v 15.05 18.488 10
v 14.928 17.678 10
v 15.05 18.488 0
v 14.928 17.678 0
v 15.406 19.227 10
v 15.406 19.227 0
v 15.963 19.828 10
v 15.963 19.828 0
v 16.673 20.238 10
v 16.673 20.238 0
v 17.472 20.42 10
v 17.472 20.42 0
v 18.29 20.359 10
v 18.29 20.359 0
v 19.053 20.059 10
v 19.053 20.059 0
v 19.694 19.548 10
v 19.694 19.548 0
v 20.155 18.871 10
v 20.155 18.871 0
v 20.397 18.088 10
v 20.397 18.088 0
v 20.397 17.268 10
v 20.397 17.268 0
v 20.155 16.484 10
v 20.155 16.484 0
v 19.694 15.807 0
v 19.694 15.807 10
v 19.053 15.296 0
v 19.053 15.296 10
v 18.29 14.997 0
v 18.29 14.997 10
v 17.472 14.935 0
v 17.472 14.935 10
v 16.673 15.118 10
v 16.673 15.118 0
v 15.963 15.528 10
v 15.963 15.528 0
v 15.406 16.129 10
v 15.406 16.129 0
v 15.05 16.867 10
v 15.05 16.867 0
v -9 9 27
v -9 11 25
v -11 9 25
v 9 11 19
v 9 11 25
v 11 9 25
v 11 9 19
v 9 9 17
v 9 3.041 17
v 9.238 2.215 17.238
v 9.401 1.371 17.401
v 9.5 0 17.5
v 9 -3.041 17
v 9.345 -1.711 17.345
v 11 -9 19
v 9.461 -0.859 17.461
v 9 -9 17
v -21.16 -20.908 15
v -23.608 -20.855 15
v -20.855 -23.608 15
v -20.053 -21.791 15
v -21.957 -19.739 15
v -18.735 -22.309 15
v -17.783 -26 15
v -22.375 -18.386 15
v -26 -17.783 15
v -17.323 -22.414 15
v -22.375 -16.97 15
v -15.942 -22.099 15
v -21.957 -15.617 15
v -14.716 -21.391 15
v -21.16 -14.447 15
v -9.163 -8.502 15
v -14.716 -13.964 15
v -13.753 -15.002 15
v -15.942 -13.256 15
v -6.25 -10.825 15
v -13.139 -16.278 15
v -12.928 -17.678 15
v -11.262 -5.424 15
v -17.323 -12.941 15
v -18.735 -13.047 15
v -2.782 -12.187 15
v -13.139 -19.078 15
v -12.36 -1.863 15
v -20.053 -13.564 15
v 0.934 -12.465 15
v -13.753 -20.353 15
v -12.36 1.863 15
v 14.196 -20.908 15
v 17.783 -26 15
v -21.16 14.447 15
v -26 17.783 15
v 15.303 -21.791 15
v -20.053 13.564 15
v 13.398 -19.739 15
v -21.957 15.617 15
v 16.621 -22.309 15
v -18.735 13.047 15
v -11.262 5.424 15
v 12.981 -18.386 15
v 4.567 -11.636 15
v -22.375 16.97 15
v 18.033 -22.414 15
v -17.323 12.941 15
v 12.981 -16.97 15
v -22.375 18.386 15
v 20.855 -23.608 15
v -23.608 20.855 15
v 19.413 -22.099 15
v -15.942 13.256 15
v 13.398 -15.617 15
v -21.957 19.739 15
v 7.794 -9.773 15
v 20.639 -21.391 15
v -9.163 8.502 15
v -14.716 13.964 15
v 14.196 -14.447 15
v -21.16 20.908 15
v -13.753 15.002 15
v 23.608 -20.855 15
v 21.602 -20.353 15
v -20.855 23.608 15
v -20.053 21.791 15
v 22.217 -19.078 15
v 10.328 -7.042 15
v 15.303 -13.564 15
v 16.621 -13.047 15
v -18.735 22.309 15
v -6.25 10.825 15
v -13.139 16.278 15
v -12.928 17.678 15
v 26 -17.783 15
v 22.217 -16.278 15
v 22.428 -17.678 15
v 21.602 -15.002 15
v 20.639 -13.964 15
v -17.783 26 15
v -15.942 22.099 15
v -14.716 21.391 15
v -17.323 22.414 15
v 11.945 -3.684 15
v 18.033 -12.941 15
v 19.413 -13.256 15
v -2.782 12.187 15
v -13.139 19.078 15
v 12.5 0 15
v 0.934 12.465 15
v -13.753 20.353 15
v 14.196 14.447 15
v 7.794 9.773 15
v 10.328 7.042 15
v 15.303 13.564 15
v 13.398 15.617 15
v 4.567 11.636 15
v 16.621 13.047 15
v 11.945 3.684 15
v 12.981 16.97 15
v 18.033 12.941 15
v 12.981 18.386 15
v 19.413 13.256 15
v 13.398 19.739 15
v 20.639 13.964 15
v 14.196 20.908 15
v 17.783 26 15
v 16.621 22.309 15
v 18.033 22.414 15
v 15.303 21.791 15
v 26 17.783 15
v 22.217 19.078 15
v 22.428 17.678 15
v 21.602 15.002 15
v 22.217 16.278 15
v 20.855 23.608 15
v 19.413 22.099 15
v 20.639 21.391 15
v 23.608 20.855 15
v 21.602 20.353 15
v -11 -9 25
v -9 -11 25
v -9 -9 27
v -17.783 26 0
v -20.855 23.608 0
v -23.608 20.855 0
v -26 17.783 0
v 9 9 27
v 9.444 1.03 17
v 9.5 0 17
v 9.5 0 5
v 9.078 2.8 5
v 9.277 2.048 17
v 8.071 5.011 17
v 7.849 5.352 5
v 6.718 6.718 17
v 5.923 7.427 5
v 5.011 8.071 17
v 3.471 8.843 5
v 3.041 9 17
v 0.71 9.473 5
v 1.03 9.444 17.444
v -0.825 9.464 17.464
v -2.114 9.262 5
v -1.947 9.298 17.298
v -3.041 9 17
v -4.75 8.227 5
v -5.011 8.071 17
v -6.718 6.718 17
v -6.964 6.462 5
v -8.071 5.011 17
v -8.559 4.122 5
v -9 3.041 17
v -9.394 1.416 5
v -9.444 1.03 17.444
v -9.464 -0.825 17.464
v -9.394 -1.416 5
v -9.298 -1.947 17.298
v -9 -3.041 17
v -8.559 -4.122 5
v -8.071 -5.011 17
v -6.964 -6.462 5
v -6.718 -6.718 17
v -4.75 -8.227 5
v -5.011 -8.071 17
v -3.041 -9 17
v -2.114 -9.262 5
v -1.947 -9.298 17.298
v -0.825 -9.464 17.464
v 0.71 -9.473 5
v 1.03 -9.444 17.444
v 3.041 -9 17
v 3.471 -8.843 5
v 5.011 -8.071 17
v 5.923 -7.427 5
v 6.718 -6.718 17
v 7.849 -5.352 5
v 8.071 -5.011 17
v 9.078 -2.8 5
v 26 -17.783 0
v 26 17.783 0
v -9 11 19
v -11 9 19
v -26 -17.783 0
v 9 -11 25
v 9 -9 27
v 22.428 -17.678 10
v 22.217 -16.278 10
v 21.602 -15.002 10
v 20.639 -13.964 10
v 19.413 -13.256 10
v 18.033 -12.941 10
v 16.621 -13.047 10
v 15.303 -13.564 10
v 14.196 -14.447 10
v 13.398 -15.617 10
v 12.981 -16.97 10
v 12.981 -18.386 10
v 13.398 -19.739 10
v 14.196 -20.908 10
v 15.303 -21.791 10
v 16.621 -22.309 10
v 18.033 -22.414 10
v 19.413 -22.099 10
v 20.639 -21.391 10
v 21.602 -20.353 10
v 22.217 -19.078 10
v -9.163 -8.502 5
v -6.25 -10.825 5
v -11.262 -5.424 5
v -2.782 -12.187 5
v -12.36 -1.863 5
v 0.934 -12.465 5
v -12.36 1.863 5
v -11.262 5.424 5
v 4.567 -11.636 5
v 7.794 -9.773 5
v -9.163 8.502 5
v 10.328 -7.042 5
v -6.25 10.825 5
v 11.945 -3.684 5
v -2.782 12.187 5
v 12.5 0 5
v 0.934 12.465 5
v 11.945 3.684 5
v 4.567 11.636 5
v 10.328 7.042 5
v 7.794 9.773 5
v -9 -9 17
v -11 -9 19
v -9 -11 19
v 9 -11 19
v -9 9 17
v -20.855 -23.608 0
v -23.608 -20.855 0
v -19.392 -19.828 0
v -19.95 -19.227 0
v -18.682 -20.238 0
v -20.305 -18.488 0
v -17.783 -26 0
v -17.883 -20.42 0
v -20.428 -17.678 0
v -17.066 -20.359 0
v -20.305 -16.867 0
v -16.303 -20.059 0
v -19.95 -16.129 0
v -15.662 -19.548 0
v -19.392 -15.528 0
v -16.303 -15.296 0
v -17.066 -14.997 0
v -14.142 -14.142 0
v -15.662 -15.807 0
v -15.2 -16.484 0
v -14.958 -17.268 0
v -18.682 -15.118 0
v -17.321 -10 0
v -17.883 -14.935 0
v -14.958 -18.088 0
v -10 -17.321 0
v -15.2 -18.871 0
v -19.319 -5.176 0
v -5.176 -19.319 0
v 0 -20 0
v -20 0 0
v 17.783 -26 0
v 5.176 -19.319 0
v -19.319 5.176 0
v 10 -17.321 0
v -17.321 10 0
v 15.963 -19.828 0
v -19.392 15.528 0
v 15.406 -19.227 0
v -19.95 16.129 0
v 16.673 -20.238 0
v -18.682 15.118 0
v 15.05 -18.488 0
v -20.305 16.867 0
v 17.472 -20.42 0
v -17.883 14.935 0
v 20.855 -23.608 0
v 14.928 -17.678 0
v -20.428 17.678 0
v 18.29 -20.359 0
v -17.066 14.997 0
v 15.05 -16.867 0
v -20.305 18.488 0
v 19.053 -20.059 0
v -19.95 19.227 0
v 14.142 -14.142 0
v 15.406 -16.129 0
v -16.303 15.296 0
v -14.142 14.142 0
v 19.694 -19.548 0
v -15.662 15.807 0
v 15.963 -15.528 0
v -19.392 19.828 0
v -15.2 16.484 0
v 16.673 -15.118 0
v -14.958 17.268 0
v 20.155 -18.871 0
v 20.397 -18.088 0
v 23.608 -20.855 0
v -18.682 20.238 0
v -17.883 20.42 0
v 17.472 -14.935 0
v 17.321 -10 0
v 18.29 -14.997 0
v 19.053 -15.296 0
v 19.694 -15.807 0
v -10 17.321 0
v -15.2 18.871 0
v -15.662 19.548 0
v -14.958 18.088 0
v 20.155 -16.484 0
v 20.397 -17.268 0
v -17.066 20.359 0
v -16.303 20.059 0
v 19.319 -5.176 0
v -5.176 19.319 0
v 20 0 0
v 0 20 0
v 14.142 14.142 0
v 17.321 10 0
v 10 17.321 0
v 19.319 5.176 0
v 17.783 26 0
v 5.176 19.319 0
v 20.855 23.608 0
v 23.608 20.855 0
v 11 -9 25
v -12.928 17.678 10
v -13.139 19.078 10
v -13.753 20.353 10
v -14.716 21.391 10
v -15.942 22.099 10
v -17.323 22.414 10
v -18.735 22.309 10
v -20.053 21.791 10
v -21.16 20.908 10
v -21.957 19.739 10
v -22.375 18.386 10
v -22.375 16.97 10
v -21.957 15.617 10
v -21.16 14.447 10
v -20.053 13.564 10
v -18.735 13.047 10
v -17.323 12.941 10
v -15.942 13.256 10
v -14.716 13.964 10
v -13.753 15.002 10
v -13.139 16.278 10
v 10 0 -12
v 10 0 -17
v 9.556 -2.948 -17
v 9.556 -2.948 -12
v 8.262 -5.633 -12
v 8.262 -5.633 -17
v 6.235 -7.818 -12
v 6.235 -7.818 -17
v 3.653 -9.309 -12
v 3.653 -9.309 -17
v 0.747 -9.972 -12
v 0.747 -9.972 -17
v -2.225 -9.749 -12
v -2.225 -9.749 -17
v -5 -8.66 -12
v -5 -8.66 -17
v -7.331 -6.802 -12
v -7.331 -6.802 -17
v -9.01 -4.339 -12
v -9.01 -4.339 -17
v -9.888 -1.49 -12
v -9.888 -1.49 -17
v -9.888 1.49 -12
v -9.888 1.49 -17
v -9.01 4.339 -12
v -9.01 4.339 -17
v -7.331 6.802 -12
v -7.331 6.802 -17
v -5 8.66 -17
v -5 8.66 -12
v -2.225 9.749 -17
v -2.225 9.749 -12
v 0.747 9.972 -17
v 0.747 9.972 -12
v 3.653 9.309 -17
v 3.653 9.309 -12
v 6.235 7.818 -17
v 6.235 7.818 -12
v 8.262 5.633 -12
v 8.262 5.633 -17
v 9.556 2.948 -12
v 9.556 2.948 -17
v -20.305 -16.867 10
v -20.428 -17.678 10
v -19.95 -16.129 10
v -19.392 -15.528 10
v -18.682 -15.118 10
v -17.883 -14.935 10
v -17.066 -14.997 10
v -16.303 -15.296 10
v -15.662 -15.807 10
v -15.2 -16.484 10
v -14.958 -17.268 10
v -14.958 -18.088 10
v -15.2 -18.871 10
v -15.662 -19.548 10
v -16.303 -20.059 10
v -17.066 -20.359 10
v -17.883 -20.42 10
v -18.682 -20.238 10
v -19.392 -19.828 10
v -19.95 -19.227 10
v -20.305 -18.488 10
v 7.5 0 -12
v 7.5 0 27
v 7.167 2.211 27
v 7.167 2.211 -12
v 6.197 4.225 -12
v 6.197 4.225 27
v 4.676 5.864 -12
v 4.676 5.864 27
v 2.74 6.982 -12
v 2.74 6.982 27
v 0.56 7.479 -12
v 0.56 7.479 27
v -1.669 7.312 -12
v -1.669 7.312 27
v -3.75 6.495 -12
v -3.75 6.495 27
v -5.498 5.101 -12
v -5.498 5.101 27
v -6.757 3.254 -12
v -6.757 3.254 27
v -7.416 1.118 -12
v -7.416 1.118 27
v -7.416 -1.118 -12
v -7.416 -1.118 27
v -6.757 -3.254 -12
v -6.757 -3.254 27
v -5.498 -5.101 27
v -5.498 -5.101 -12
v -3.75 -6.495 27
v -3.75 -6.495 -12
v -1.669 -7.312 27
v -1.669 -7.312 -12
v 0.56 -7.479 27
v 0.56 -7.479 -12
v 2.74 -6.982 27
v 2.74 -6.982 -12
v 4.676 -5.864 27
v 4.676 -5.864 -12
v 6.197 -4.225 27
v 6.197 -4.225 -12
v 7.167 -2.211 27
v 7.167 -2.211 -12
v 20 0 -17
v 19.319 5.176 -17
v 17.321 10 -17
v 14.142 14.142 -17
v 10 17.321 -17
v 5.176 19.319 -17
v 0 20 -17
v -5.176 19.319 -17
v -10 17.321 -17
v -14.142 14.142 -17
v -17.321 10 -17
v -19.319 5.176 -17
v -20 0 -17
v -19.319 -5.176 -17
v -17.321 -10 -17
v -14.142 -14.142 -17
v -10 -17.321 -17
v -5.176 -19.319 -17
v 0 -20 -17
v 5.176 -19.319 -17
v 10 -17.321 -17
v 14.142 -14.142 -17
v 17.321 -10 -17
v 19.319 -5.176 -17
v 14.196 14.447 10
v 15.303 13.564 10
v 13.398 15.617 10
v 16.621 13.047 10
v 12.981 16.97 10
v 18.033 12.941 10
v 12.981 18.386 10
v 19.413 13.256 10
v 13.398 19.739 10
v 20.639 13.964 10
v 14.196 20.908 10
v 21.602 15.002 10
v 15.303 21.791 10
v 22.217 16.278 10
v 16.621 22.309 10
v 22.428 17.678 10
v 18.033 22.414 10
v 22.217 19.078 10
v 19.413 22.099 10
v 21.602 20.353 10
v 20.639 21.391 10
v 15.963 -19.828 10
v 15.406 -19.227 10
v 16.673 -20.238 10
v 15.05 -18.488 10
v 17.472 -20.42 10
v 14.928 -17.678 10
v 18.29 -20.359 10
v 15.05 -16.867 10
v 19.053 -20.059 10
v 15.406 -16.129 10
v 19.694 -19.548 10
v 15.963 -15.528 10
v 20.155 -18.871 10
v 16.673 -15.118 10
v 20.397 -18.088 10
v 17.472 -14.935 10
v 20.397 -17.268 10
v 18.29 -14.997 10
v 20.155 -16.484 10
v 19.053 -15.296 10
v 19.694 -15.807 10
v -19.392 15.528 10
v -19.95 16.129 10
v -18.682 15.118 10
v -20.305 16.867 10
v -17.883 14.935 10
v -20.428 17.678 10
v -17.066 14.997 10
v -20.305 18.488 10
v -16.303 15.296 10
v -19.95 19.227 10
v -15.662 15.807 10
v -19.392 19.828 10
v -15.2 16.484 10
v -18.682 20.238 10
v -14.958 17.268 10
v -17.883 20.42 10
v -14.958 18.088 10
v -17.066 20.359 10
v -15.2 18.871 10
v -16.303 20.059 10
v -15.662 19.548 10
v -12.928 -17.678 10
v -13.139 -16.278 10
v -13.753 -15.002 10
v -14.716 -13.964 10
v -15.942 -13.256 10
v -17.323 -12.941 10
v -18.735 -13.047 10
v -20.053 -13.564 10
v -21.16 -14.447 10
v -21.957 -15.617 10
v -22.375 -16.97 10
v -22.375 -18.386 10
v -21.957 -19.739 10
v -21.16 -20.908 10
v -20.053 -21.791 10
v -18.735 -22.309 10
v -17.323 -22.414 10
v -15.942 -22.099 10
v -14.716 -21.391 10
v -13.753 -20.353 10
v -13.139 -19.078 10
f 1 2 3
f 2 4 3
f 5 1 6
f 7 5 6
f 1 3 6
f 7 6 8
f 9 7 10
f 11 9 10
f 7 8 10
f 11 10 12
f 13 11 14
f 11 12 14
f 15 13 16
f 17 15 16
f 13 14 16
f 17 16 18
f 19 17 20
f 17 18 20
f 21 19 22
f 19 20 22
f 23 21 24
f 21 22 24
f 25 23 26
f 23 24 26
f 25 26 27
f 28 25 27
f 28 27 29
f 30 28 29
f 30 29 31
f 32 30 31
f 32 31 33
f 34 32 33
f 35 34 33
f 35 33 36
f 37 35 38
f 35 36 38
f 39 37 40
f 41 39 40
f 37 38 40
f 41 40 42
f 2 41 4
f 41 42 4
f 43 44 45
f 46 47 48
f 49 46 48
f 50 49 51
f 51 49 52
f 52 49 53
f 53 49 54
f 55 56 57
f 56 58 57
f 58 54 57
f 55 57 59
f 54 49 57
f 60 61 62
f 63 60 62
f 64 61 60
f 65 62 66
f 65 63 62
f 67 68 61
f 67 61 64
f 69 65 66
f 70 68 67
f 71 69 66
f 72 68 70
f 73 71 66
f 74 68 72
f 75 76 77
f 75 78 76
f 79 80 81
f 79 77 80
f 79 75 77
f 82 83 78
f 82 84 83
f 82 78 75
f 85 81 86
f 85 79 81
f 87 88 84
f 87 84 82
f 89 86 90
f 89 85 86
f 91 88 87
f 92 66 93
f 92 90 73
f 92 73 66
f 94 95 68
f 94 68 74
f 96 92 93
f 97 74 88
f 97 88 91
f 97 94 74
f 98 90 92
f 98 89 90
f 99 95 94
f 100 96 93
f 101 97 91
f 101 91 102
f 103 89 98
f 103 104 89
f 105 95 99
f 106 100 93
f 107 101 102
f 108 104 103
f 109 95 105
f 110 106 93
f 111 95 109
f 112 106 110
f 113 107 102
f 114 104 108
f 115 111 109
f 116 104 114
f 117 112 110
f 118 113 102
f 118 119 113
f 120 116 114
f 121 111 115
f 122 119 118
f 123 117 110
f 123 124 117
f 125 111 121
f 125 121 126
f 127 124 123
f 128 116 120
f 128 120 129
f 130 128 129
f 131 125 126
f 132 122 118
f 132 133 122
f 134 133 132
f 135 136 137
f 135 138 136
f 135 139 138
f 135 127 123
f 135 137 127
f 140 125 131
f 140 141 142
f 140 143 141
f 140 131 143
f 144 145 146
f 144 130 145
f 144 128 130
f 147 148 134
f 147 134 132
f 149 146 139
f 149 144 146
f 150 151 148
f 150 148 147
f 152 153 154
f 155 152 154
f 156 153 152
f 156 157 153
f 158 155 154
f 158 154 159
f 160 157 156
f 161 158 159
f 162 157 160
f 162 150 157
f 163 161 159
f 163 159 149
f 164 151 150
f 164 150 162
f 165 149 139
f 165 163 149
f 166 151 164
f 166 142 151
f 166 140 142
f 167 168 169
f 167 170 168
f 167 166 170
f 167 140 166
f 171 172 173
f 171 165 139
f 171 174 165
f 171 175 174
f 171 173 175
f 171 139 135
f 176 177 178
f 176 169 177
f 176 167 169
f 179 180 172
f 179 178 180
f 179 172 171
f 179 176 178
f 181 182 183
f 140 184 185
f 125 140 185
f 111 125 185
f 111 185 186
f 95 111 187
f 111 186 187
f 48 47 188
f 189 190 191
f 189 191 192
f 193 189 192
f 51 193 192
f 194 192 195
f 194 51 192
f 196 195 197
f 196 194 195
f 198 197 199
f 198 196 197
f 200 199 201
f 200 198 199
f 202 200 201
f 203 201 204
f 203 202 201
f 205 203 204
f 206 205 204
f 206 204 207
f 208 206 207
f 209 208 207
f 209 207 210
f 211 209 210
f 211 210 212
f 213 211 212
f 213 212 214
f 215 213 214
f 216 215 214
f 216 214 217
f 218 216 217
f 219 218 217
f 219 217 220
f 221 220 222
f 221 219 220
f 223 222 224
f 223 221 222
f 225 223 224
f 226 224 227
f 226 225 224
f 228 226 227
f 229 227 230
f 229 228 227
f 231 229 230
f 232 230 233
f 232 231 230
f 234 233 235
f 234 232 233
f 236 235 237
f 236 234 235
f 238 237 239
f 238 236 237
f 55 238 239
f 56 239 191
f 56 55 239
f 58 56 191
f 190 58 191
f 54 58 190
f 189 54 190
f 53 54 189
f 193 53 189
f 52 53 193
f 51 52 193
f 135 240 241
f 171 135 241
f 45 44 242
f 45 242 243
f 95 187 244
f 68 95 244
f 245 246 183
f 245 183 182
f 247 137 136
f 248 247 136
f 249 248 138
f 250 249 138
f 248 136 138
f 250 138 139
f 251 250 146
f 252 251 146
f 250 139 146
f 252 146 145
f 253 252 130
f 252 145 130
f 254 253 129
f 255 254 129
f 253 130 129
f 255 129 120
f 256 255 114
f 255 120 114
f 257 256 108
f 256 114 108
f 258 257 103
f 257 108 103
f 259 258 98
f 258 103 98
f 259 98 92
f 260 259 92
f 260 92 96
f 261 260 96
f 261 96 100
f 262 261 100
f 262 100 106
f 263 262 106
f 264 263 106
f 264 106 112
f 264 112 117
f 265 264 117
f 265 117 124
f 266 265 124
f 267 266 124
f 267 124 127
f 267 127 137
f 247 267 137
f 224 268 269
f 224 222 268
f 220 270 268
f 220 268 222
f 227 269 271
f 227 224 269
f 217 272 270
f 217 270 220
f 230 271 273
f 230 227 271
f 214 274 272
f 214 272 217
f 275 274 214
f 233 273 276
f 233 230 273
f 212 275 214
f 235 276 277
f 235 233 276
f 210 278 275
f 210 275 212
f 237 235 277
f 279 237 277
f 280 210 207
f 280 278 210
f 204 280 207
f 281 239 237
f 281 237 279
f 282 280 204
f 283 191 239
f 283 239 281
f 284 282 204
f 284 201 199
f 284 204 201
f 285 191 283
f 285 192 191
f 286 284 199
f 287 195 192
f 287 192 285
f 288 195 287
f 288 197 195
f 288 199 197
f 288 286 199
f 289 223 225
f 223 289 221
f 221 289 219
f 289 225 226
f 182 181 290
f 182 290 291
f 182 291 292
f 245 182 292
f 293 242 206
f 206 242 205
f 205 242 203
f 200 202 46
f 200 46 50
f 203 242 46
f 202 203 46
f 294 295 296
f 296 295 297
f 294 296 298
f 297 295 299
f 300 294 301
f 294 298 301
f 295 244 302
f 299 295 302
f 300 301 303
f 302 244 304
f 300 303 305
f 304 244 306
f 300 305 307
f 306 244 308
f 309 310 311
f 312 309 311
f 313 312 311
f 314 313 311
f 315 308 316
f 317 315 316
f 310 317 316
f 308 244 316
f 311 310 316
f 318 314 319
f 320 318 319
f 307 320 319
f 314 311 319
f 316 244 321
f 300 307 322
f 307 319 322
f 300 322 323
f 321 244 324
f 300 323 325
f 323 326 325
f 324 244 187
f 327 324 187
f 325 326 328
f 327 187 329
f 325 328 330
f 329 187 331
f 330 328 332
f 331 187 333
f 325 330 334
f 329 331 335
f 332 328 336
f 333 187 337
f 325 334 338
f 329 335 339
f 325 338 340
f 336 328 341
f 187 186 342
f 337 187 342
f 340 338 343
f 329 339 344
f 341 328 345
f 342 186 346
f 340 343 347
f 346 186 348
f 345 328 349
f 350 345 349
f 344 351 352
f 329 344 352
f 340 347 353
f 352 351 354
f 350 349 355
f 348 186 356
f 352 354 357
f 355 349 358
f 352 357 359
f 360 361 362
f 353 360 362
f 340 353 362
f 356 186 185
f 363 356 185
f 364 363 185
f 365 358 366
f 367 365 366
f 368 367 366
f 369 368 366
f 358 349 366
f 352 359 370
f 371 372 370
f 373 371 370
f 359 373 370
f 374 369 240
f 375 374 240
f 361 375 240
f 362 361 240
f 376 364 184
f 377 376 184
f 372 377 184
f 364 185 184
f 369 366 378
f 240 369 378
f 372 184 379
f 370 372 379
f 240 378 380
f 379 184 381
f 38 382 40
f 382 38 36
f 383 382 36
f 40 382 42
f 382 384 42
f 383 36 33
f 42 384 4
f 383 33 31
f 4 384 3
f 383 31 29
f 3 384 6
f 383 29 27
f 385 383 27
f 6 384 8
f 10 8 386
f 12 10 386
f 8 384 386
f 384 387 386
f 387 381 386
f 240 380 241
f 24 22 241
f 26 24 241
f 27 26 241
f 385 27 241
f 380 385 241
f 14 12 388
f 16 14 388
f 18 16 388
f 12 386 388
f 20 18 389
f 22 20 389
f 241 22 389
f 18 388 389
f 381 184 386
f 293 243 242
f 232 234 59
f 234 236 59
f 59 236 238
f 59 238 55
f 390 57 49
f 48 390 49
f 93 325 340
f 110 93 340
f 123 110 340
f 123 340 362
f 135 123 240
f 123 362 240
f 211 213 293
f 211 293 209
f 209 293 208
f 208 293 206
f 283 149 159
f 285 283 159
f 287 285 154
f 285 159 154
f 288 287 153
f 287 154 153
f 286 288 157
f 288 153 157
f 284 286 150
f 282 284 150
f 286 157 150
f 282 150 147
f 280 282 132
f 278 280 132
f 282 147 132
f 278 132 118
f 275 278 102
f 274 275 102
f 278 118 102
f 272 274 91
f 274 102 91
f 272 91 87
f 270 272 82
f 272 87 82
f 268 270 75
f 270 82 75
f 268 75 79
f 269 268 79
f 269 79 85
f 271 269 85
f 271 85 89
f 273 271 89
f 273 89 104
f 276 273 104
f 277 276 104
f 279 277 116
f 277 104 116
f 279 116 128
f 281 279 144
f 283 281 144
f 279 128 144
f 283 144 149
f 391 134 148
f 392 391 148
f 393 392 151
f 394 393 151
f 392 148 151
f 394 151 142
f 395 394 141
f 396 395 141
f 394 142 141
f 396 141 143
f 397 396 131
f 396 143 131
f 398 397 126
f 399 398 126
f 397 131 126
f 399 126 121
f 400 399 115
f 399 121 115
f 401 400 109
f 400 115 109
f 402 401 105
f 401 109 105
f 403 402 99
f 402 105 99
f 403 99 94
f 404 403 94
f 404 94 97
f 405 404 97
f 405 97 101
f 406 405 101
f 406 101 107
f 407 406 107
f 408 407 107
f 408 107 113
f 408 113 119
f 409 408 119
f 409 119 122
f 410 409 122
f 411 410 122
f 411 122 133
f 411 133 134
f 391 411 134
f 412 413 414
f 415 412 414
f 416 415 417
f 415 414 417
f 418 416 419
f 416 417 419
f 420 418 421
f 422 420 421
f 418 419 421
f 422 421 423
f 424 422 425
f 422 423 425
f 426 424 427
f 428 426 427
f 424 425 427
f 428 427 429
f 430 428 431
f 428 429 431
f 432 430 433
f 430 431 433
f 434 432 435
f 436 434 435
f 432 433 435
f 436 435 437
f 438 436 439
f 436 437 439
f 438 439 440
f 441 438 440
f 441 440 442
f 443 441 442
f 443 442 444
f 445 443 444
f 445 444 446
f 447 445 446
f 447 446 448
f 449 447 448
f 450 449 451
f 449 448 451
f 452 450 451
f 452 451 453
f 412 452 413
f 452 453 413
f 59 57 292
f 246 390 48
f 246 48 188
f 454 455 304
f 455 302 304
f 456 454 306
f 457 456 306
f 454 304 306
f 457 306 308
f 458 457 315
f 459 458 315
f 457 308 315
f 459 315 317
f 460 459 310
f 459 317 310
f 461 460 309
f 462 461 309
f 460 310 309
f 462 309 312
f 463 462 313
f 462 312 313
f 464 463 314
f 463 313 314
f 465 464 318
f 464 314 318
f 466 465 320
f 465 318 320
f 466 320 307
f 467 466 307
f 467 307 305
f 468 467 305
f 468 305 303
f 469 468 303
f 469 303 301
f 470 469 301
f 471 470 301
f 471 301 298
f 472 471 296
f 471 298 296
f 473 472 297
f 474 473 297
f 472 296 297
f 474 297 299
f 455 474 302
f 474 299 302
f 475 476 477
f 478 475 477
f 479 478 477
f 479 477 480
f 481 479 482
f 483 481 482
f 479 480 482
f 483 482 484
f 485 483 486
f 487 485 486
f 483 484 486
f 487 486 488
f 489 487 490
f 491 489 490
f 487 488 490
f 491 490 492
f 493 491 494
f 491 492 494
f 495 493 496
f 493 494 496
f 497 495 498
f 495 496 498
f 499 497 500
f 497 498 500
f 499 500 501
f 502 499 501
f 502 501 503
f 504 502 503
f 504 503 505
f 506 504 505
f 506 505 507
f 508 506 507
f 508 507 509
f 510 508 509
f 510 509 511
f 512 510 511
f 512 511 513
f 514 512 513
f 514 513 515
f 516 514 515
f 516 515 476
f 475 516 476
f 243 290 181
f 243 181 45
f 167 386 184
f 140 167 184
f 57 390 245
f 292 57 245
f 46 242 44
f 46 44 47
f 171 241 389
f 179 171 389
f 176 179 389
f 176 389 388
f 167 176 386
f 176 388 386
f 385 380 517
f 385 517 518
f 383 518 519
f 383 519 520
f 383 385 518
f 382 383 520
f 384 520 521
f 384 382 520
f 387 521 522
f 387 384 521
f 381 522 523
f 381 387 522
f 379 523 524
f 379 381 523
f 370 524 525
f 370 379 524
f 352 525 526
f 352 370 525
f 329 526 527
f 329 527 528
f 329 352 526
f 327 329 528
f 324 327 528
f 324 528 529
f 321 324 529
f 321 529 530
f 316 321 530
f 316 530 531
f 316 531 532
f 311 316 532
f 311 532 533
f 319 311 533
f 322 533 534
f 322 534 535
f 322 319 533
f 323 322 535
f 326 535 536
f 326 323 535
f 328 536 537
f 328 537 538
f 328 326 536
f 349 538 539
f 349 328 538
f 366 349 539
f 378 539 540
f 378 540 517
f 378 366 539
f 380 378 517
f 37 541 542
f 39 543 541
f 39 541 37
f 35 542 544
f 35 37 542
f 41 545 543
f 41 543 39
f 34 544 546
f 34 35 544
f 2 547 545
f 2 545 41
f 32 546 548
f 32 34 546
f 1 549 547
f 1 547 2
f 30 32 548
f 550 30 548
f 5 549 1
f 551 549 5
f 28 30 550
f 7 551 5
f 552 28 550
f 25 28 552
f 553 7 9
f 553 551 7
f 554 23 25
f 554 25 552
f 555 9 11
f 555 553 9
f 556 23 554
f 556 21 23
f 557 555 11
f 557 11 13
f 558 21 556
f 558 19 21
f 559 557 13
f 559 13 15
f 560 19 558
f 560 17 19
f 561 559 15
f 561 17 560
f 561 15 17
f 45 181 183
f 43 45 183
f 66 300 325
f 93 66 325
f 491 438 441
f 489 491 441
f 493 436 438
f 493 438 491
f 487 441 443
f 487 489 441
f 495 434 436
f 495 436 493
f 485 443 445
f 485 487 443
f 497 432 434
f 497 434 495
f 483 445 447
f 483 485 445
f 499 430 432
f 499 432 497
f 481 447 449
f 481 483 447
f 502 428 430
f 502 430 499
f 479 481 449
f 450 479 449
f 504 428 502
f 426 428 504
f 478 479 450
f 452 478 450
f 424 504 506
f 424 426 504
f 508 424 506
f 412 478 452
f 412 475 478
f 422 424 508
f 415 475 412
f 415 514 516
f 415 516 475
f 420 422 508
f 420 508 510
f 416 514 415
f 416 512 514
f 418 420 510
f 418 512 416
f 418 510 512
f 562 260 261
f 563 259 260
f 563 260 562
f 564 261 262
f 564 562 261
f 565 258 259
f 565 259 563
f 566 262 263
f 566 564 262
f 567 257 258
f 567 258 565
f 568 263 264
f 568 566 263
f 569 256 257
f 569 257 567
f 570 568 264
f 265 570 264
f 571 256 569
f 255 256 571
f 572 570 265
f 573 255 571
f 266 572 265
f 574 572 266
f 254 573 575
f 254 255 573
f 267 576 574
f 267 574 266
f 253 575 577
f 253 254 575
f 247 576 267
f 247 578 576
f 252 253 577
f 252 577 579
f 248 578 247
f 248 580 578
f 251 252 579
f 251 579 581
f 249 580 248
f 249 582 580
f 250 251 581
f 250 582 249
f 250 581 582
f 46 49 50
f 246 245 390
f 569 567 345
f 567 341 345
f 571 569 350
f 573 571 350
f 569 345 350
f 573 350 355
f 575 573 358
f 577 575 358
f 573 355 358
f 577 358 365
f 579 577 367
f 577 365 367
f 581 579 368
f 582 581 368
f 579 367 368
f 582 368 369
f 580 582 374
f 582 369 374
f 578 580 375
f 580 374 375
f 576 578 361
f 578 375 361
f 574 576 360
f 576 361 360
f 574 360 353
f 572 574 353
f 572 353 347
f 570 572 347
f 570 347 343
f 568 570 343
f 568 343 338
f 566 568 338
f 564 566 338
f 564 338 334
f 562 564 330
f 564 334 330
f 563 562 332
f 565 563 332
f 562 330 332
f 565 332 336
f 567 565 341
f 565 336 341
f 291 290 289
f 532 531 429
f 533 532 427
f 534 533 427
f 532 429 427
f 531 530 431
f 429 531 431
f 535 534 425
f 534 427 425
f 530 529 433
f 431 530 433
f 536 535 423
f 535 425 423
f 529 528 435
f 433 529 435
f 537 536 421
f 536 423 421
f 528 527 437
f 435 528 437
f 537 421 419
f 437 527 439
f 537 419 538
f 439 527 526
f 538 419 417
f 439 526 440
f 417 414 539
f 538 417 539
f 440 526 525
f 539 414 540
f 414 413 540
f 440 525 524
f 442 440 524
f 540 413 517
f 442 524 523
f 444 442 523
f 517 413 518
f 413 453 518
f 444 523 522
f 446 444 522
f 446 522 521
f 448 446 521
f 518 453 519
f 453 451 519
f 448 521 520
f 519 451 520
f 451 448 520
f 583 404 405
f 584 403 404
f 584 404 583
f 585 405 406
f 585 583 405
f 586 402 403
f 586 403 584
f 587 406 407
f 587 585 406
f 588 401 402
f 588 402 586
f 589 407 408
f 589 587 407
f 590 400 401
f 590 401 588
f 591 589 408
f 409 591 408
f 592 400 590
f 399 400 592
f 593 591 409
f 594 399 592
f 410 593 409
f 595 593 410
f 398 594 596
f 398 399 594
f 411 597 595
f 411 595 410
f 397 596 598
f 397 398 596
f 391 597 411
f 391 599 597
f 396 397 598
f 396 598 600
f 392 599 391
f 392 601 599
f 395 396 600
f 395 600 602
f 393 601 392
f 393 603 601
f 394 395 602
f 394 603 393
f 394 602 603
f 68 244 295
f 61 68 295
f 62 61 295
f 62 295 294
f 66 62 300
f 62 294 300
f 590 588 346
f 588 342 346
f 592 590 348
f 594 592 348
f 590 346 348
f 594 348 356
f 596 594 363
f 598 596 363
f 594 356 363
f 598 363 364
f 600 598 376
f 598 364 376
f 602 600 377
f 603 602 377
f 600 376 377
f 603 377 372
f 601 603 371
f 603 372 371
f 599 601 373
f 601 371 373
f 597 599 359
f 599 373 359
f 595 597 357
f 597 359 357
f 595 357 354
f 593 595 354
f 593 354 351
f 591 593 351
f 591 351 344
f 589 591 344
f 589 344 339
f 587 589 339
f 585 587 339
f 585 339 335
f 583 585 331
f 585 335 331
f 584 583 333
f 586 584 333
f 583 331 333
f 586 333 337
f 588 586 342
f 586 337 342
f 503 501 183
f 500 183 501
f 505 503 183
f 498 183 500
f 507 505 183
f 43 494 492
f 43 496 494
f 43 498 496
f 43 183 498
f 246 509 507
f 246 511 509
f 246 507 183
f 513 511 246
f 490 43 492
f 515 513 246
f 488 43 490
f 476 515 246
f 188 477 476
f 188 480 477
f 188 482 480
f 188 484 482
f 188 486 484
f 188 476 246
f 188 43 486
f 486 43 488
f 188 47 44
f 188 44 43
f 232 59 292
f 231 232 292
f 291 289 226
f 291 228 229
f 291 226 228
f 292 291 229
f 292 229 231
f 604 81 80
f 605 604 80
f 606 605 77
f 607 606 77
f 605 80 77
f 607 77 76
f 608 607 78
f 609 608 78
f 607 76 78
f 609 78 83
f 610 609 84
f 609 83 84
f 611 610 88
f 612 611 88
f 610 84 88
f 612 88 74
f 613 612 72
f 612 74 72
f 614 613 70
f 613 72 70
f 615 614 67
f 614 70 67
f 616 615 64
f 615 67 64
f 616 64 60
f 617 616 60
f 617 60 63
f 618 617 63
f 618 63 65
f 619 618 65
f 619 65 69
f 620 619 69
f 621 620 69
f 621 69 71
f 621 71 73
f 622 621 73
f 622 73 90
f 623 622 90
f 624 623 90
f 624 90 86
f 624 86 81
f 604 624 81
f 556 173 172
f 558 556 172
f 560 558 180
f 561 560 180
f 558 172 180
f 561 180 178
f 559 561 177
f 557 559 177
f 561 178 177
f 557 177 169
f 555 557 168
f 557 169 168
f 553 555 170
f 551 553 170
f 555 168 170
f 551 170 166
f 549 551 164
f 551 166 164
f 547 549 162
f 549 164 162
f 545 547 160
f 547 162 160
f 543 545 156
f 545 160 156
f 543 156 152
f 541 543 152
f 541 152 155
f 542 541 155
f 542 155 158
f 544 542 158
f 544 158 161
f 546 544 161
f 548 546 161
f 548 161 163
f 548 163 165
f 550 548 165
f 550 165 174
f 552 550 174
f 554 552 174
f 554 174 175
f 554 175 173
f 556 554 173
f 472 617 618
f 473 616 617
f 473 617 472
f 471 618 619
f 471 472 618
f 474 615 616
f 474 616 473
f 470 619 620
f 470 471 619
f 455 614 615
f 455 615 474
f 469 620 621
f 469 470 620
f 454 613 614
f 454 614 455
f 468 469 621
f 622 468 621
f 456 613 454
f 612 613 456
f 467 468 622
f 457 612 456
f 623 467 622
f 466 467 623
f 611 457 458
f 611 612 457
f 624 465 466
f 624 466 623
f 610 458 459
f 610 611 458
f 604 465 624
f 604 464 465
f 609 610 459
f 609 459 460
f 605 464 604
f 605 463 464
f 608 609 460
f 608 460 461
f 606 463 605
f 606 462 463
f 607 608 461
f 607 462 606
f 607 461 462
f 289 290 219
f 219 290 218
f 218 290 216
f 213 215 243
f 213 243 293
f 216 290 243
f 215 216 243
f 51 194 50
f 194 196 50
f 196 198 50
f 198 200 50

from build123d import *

# Parameters (mm, degrees)
F0_R            = 20
F1_DEPTH        = 17
F3_DEPTH        = 15
F4_R            = 12.5
F4_R_2          = 9.5
F5_DEPTH        = 10
F6_R            = 9.5
F7_DEPTH        = 2
F8_W            = 22
F8_H            = 22
F9_DEPTH        = 10
F10_T1_DEPTH    = 2.5403411844
F10_T3_DEPTH    = 2.5403411844
F10_T5_DEPTH    = 2.5403411844
F10_T7_DEPTH    = 2.5403411844
F10_T9_DEPTH    = 2.5403411844
F10_T11_DEPTH   = 2.5403411844
F10_T13_DEPTH   = 2.5403411844
F10_T15_DEPTH   = 2.5403411844
F10_T17_DEPTH   = 32.2867319519
F10_T19_DEPTH   = 32.2867319519
F10_T24_DEPTH   = 20.2867319519
F10_T29_DEPTH   = 20.2867319519
F10_T34_DEPTH   = 20.2867319519
F10_T39_DEPTH   = 20.2867319519
F10_T44_DEPTH   = 32.2867319519
F10_S45_R       = 9.5
F10_T46_DEPTH   = 18
F10_T50_DEPTH   = 32.2867319519
F10_S51_R       = 9.5
F10_T52_DEPTH   = 18
F10_T56_DEPTH   = 32.2867319519
F10_S57_R       = 9.5
F10_T58_DEPTH   = 18
F10_T62_DEPTH   = 32.2867319519
F10_S63_R       = 9.5
F10_T64_DEPTH   = 18
F11_R           = 10
F12_DEPTH       = 5
F13_R           = 7.5
F14_DEPTH       = 44.001
F16_D           = 5.5
F16_CBORE_D     = 9.5
F16_CBORE_DEPTH = 5


# Not quite as in the source:
# - a fillet or chamfer that OpenCascade refuses, or shapes differently, is made with other operations: its cross-section is extruded or revolved along the edge and cut away or added


with BuildPart() as f1:
    # F0 (on Top) → F1 (new body)
    with BuildSketch(Plane.XY):
        Circle(F0_R)
    extrude(amount=-F1_DEPTH)

    # F2 (on Top) → F3 (join)
    with BuildSketch(Plane.XY):
        with BuildLine():
            Line((17.7834192438, 26), (-17.7834192438, 26))
            ThreePointArc((-17.7834192438, 26), (-22.2738636074, 22.2738636074), (-26, 17.7834192438))
            Line((-26, 17.7834192438), (-26, -17.7834192438))
            ThreePointArc((-26, -17.7834192438), (-22.2738636074, -22.2738636074), (-17.7834192438, -26))
            Line((-17.7834192438, -26), (17.7834192438, -26))
            ThreePointArc((17.7834192438, -26), (22.2738636074, -22.2738636074), (26, -17.7834192438))
            Line((26, -17.7834192438), (26, 17.7834192438))
            ThreePointArc((26, 17.7834192438), (22.2738636074, 22.2738636074), (17.7834192438, 26))
        make_face()
    extrude(amount=F3_DEPTH)

    # F4 (on face) → F5 (cut)
    with BuildSketch(Plane.XY.offset(15)):
        Circle(F4_R)
        Circle(F4_R_2, mode=Mode.SUBTRACT)
    extrude(amount=-F5_DEPTH, mode=Mode.SUBTRACT)

    # F6 (on face) → F7 (join)
    with BuildSketch(Plane.XY.offset(15)):
        Circle(F6_R)
    extrude(amount=F7_DEPTH)

    # F8 (on face) → F9 (join)
    with BuildSketch(Plane.XY.offset(17)):
        Rectangle(F8_W, F8_H)
    extrude(amount=F9_DEPTH)

    # F10: chamfer of 2 on 12 edges, made by hand

    # F10_s2 → F10_t1 (cut)
    with BuildSketch(Plane(origin=(-0.3333333333, 0.3333333333, -0.3333333333), x_dir=(-0.7071067812, -0.7071067812, 0), z_dir=(-0.5773502692, 0.5773502692, -0.5773502692))):
        Polygon((-1.4142135624, 23.6784008469), (1.4142135624, 23.6784008469), (0, 21.2289111041), align=None)
    extrude(amount=F10_T1_DEPTH, mode=Mode.SUBTRACT)

    # F10_s4 → F10_t3 (cut)
    with BuildSketch(Plane(origin=(-15, 15, 15), x_dir=(-0.7071067812, -0.7071067812, 0), z_dir=(-0.5773502692, 0.5773502692, 0.5773502692))):
        Polygon((-1.4142135624, 12.2474487139), (1.4142135624, 12.2474487139), (0, 14.6969384567), align=None)
    extrude(amount=F10_T3_DEPTH, mode=Mode.SUBTRACT)

    # F10_s6 → F10_t5 (cut)
    with BuildSketch(Plane(origin=(0.3333333333, 0.3333333333, -0.3333333333), x_dir=(-0.7071067812, 0.7071067812, 0), z_dir=(0.5773502692, 0.5773502692, -0.5773502692))):
        Polygon((1.4142135624, 23.6784008469), (-1.4142135624, 23.6784008469), (0, 21.2289111041), align=None)
    extrude(amount=F10_T5_DEPTH, mode=Mode.SUBTRACT)

    # F10_s8 → F10_t7 (cut)
    with BuildSketch(Plane(origin=(15, 15, 15), x_dir=(-0.7071067812, 0.7071067812, 0), z_dir=(0.5773502692, 0.5773502692, 0.5773502692))):
        Polygon((1.4142135624, 12.2474487139), (-1.4142135624, 12.2474487139), (0, 14.6969384567), align=None)
    extrude(amount=F10_T7_DEPTH, mode=Mode.SUBTRACT)

    # F10_s10 → F10_t9 (cut)
    with BuildSketch(Plane(origin=(0.3333333333, -0.3333333333, -0.3333333333), x_dir=(0.7071067812, 0.7071067812, 0), z_dir=(0.5773502692, -0.5773502692, -0.5773502692))):
        Polygon((1.4142135624, 23.6784008469), (0, 21.2289111041), (-1.4142135624, 23.6784008469), align=None)
    extrude(amount=F10_T9_DEPTH, mode=Mode.SUBTRACT)

    # F10_s12 → F10_t11 (cut)
    with BuildSketch(Plane(origin=(15, -15, 15), x_dir=(0.7071067812, 0.7071067812, 0), z_dir=(0.5773502692, -0.5773502692, 0.5773502692))):
        Polygon((1.4142135624, 12.2474487139), (0, 14.6969384567), (-1.4142135624, 12.2474487139), align=None)
    extrude(amount=F10_T11_DEPTH, mode=Mode.SUBTRACT)

    # F10_s14 → F10_t13 (cut)
    with BuildSketch(Plane(origin=(-0.3333333333, -0.3333333333, -0.3333333333), x_dir=(0.7071067812, -0.7071067812, 0), z_dir=(-0.5773502692, -0.5773502692, -0.5773502692))):
        Polygon((-1.4142135624, 23.6784008469), (0, 21.2289111041), (1.4142135624, 23.6784008469), align=None)
    extrude(amount=F10_T13_DEPTH, mode=Mode.SUBTRACT)

    # F10_s16 → F10_t15 (cut)
    with BuildSketch(Plane(origin=(-15, -15, 15), x_dir=(0.7071067812, -0.7071067812, 0), z_dir=(-0.5773502692, -0.5773502692, 0.5773502692))):
        Polygon((-1.4142135624, 12.2474487139), (0, 14.6969384567), (1.4142135624, 12.2474487139), align=None)
    extrude(amount=F10_T15_DEPTH, mode=Mode.SUBTRACT)

    # F10_s18 → F10_t17 (cut)
    with BuildSketch(Plane.XZ.offset(-16.1433659759)):
        Polygon((-11, 25), (-9, 27), (-11, 27), align=None)
        Polygon((11, 25), (9, 27), (11, 27), align=None)
    extrude(amount=F10_T17_DEPTH, mode=Mode.SUBTRACT)

    # F10_s20 → F10_t19 (cut)
    with BuildSketch(Plane.YZ.offset(-16.1433659759)):
        Polygon((-9, 27), (-11, 25), (-11, 27), align=None)
        Polygon((11, 25), (9, 27), (11, 27), align=None)
    extrude(amount=F10_T19_DEPTH, mode=Mode.SUBTRACT)


with BuildPart() as f10_tool22:
    # F10_s23 → F10_t24 (new body)
    with BuildSketch(Plane.XY.offset(11.8566340241)):
        Polygon((-9, 11), (-11, 9), (-11, 11), align=None)
    extrude(amount=F10_T24_DEPTH)

    split(bisect_by=Plane.XY.offset(15), keep=Keep.TOP)


with BuildPart() as f1_1:
    add(f1.part)

    # F10_t21: cut F10_tool22
    add(f10_tool22.part, mode=Mode.SUBTRACT)


with BuildPart() as f10_tool27:
    # F10_s28 → F10_t29 (new body)
    with BuildSketch(Plane.XY.offset(11.8566340241)):
        Polygon((9, 11), (11, 9), (11, 11), align=None)
    extrude(amount=F10_T29_DEPTH)

    split(bisect_by=Plane.XY.offset(15), keep=Keep.TOP)


with BuildPart() as f1_2:
    add(f1_1.part)

    # F10_t26: cut F10_tool27
    add(f10_tool27.part, mode=Mode.SUBTRACT)


with BuildPart() as f10_tool32:
    # F10_s33 → F10_t34 (new body)
    with BuildSketch(Plane.XY.offset(11.8566340241)):
        Polygon((11, -9), (9, -11), (11, -11), align=None)
    extrude(amount=F10_T34_DEPTH)

    split(bisect_by=Plane.XY.offset(15), keep=Keep.TOP)


with BuildPart() as f1_3:
    add(f1_2.part)

    # F10_t31: cut F10_tool32
    add(f10_tool32.part, mode=Mode.SUBTRACT)


with BuildPart() as f10_tool37:
    # F10_s38 → F10_t39 (new body)
    with BuildSketch(Plane.XY.offset(11.8566340241)):
        Polygon((-11, -9), (-9, -11), (-11, -11), align=None)
    extrude(amount=F10_T39_DEPTH)

    split(bisect_by=Plane.XY.offset(15), keep=Keep.TOP)


with BuildPart() as f1_4:
    add(f1_3.part)

    # F10_t36: cut F10_tool37
    add(f10_tool37.part, mode=Mode.SUBTRACT)


with BuildPart() as f10_tool42:
    # F10_s43 → F10_t44 (new body)
    with BuildSketch(Plane.XZ.offset(-16.1433659759)):
        Polygon((-11, 19), (-9, 17), (-11, 17), align=None)
    extrude(amount=F10_T44_DEPTH)

    # F10_s45 → F10_t46 (cut, symmetric)
    with BuildSketch(Plane.XY.offset(18)):
        Circle(F10_S45_R)
    extrude(amount=F10_T46_DEPTH, both=True, mode=Mode.SUBTRACT)


with BuildPart() as f1_5:
    add(f1_4.part)

    # F10_t41: cut F10_tool42
    add(f10_tool42.part, mode=Mode.SUBTRACT)


with BuildPart() as f10_tool48:
    # F10_s49 → F10_t50 (new body)
    with BuildSketch(Plane.XZ.offset(16.1433659759)):
        Polygon((11, 19), (9, 17), (11, 17), align=None)
    extrude(amount=-F10_T50_DEPTH)

    # F10_s51 → F10_t52 (cut, symmetric)
    with BuildSketch(Plane.XY.offset(18)):
        Circle(F10_S51_R)
    extrude(amount=F10_T52_DEPTH, both=True, mode=Mode.SUBTRACT)


with BuildPart() as f1_6:
    add(f1_5.part)

    # F10_t47: cut F10_tool48
    add(f10_tool48.part, mode=Mode.SUBTRACT)


with BuildPart() as f10_tool54:
    # F10_s55 → F10_t56 (new body)
    with BuildSketch(Plane.YZ.offset(-16.1433659759)):
        Polygon((-9, 17), (-11, 19), (-11, 17), align=None)
    extrude(amount=F10_T56_DEPTH)

    # F10_s57 → F10_t58 (cut, symmetric)
    with BuildSketch(Plane.XY.offset(18)):
        Circle(F10_S57_R)
    extrude(amount=F10_T58_DEPTH, both=True, mode=Mode.SUBTRACT)


with BuildPart() as f1_7:
    add(f1_6.part)

    # F10_t53: cut F10_tool54
    add(f10_tool54.part, mode=Mode.SUBTRACT)


with BuildPart() as f10_tool60:
    # F10_s61 → F10_t62 (new body)
    with BuildSketch(Plane.YZ.offset(16.1433659759)):
        Polygon((11, 19), (9, 17), (11, 17), align=None)
    extrude(amount=-F10_T62_DEPTH)

    # F10_s63 → F10_t64 (cut, symmetric)
    with BuildSketch(Plane.XY.offset(18)):
        Circle(F10_S63_R)
    extrude(amount=F10_T64_DEPTH, both=True, mode=Mode.SUBTRACT)


with BuildPart() as f1_8:
    add(f1_7.part)

    # F10_t59: cut F10_tool60
    add(f10_tool60.part, mode=Mode.SUBTRACT)

    # F11 (on face) → F12 (cut)
    with BuildSketch(Plane(origin=(0, 0, -17), x_dir=(1, 0, 0), z_dir=(0, 0, -1))):
        Circle(F11_R)
    extrude(amount=-F12_DEPTH, mode=Mode.SUBTRACT)

    # F13 (on face) → F14 (cut, through all)
    with BuildSketch(Plane.XY.offset(27)):
        Circle(F13_R)
    extrude(amount=-F14_DEPTH, mode=Mode.SUBTRACT)

    # F16 (through all)
    with Locations(Plane.XY.offset(15)):
        with Locations((17.6776695297, 17.6776695297), (17.6776695297, -17.6776695297), (-17.6776695297, -17.6776695297), (-17.6776695297, 17.6776695297)):
            CounterBoreHole(F16_D / 2, F16_CBORE_D / 2, F16_CBORE_DEPTH)


solid = f1_8.part
